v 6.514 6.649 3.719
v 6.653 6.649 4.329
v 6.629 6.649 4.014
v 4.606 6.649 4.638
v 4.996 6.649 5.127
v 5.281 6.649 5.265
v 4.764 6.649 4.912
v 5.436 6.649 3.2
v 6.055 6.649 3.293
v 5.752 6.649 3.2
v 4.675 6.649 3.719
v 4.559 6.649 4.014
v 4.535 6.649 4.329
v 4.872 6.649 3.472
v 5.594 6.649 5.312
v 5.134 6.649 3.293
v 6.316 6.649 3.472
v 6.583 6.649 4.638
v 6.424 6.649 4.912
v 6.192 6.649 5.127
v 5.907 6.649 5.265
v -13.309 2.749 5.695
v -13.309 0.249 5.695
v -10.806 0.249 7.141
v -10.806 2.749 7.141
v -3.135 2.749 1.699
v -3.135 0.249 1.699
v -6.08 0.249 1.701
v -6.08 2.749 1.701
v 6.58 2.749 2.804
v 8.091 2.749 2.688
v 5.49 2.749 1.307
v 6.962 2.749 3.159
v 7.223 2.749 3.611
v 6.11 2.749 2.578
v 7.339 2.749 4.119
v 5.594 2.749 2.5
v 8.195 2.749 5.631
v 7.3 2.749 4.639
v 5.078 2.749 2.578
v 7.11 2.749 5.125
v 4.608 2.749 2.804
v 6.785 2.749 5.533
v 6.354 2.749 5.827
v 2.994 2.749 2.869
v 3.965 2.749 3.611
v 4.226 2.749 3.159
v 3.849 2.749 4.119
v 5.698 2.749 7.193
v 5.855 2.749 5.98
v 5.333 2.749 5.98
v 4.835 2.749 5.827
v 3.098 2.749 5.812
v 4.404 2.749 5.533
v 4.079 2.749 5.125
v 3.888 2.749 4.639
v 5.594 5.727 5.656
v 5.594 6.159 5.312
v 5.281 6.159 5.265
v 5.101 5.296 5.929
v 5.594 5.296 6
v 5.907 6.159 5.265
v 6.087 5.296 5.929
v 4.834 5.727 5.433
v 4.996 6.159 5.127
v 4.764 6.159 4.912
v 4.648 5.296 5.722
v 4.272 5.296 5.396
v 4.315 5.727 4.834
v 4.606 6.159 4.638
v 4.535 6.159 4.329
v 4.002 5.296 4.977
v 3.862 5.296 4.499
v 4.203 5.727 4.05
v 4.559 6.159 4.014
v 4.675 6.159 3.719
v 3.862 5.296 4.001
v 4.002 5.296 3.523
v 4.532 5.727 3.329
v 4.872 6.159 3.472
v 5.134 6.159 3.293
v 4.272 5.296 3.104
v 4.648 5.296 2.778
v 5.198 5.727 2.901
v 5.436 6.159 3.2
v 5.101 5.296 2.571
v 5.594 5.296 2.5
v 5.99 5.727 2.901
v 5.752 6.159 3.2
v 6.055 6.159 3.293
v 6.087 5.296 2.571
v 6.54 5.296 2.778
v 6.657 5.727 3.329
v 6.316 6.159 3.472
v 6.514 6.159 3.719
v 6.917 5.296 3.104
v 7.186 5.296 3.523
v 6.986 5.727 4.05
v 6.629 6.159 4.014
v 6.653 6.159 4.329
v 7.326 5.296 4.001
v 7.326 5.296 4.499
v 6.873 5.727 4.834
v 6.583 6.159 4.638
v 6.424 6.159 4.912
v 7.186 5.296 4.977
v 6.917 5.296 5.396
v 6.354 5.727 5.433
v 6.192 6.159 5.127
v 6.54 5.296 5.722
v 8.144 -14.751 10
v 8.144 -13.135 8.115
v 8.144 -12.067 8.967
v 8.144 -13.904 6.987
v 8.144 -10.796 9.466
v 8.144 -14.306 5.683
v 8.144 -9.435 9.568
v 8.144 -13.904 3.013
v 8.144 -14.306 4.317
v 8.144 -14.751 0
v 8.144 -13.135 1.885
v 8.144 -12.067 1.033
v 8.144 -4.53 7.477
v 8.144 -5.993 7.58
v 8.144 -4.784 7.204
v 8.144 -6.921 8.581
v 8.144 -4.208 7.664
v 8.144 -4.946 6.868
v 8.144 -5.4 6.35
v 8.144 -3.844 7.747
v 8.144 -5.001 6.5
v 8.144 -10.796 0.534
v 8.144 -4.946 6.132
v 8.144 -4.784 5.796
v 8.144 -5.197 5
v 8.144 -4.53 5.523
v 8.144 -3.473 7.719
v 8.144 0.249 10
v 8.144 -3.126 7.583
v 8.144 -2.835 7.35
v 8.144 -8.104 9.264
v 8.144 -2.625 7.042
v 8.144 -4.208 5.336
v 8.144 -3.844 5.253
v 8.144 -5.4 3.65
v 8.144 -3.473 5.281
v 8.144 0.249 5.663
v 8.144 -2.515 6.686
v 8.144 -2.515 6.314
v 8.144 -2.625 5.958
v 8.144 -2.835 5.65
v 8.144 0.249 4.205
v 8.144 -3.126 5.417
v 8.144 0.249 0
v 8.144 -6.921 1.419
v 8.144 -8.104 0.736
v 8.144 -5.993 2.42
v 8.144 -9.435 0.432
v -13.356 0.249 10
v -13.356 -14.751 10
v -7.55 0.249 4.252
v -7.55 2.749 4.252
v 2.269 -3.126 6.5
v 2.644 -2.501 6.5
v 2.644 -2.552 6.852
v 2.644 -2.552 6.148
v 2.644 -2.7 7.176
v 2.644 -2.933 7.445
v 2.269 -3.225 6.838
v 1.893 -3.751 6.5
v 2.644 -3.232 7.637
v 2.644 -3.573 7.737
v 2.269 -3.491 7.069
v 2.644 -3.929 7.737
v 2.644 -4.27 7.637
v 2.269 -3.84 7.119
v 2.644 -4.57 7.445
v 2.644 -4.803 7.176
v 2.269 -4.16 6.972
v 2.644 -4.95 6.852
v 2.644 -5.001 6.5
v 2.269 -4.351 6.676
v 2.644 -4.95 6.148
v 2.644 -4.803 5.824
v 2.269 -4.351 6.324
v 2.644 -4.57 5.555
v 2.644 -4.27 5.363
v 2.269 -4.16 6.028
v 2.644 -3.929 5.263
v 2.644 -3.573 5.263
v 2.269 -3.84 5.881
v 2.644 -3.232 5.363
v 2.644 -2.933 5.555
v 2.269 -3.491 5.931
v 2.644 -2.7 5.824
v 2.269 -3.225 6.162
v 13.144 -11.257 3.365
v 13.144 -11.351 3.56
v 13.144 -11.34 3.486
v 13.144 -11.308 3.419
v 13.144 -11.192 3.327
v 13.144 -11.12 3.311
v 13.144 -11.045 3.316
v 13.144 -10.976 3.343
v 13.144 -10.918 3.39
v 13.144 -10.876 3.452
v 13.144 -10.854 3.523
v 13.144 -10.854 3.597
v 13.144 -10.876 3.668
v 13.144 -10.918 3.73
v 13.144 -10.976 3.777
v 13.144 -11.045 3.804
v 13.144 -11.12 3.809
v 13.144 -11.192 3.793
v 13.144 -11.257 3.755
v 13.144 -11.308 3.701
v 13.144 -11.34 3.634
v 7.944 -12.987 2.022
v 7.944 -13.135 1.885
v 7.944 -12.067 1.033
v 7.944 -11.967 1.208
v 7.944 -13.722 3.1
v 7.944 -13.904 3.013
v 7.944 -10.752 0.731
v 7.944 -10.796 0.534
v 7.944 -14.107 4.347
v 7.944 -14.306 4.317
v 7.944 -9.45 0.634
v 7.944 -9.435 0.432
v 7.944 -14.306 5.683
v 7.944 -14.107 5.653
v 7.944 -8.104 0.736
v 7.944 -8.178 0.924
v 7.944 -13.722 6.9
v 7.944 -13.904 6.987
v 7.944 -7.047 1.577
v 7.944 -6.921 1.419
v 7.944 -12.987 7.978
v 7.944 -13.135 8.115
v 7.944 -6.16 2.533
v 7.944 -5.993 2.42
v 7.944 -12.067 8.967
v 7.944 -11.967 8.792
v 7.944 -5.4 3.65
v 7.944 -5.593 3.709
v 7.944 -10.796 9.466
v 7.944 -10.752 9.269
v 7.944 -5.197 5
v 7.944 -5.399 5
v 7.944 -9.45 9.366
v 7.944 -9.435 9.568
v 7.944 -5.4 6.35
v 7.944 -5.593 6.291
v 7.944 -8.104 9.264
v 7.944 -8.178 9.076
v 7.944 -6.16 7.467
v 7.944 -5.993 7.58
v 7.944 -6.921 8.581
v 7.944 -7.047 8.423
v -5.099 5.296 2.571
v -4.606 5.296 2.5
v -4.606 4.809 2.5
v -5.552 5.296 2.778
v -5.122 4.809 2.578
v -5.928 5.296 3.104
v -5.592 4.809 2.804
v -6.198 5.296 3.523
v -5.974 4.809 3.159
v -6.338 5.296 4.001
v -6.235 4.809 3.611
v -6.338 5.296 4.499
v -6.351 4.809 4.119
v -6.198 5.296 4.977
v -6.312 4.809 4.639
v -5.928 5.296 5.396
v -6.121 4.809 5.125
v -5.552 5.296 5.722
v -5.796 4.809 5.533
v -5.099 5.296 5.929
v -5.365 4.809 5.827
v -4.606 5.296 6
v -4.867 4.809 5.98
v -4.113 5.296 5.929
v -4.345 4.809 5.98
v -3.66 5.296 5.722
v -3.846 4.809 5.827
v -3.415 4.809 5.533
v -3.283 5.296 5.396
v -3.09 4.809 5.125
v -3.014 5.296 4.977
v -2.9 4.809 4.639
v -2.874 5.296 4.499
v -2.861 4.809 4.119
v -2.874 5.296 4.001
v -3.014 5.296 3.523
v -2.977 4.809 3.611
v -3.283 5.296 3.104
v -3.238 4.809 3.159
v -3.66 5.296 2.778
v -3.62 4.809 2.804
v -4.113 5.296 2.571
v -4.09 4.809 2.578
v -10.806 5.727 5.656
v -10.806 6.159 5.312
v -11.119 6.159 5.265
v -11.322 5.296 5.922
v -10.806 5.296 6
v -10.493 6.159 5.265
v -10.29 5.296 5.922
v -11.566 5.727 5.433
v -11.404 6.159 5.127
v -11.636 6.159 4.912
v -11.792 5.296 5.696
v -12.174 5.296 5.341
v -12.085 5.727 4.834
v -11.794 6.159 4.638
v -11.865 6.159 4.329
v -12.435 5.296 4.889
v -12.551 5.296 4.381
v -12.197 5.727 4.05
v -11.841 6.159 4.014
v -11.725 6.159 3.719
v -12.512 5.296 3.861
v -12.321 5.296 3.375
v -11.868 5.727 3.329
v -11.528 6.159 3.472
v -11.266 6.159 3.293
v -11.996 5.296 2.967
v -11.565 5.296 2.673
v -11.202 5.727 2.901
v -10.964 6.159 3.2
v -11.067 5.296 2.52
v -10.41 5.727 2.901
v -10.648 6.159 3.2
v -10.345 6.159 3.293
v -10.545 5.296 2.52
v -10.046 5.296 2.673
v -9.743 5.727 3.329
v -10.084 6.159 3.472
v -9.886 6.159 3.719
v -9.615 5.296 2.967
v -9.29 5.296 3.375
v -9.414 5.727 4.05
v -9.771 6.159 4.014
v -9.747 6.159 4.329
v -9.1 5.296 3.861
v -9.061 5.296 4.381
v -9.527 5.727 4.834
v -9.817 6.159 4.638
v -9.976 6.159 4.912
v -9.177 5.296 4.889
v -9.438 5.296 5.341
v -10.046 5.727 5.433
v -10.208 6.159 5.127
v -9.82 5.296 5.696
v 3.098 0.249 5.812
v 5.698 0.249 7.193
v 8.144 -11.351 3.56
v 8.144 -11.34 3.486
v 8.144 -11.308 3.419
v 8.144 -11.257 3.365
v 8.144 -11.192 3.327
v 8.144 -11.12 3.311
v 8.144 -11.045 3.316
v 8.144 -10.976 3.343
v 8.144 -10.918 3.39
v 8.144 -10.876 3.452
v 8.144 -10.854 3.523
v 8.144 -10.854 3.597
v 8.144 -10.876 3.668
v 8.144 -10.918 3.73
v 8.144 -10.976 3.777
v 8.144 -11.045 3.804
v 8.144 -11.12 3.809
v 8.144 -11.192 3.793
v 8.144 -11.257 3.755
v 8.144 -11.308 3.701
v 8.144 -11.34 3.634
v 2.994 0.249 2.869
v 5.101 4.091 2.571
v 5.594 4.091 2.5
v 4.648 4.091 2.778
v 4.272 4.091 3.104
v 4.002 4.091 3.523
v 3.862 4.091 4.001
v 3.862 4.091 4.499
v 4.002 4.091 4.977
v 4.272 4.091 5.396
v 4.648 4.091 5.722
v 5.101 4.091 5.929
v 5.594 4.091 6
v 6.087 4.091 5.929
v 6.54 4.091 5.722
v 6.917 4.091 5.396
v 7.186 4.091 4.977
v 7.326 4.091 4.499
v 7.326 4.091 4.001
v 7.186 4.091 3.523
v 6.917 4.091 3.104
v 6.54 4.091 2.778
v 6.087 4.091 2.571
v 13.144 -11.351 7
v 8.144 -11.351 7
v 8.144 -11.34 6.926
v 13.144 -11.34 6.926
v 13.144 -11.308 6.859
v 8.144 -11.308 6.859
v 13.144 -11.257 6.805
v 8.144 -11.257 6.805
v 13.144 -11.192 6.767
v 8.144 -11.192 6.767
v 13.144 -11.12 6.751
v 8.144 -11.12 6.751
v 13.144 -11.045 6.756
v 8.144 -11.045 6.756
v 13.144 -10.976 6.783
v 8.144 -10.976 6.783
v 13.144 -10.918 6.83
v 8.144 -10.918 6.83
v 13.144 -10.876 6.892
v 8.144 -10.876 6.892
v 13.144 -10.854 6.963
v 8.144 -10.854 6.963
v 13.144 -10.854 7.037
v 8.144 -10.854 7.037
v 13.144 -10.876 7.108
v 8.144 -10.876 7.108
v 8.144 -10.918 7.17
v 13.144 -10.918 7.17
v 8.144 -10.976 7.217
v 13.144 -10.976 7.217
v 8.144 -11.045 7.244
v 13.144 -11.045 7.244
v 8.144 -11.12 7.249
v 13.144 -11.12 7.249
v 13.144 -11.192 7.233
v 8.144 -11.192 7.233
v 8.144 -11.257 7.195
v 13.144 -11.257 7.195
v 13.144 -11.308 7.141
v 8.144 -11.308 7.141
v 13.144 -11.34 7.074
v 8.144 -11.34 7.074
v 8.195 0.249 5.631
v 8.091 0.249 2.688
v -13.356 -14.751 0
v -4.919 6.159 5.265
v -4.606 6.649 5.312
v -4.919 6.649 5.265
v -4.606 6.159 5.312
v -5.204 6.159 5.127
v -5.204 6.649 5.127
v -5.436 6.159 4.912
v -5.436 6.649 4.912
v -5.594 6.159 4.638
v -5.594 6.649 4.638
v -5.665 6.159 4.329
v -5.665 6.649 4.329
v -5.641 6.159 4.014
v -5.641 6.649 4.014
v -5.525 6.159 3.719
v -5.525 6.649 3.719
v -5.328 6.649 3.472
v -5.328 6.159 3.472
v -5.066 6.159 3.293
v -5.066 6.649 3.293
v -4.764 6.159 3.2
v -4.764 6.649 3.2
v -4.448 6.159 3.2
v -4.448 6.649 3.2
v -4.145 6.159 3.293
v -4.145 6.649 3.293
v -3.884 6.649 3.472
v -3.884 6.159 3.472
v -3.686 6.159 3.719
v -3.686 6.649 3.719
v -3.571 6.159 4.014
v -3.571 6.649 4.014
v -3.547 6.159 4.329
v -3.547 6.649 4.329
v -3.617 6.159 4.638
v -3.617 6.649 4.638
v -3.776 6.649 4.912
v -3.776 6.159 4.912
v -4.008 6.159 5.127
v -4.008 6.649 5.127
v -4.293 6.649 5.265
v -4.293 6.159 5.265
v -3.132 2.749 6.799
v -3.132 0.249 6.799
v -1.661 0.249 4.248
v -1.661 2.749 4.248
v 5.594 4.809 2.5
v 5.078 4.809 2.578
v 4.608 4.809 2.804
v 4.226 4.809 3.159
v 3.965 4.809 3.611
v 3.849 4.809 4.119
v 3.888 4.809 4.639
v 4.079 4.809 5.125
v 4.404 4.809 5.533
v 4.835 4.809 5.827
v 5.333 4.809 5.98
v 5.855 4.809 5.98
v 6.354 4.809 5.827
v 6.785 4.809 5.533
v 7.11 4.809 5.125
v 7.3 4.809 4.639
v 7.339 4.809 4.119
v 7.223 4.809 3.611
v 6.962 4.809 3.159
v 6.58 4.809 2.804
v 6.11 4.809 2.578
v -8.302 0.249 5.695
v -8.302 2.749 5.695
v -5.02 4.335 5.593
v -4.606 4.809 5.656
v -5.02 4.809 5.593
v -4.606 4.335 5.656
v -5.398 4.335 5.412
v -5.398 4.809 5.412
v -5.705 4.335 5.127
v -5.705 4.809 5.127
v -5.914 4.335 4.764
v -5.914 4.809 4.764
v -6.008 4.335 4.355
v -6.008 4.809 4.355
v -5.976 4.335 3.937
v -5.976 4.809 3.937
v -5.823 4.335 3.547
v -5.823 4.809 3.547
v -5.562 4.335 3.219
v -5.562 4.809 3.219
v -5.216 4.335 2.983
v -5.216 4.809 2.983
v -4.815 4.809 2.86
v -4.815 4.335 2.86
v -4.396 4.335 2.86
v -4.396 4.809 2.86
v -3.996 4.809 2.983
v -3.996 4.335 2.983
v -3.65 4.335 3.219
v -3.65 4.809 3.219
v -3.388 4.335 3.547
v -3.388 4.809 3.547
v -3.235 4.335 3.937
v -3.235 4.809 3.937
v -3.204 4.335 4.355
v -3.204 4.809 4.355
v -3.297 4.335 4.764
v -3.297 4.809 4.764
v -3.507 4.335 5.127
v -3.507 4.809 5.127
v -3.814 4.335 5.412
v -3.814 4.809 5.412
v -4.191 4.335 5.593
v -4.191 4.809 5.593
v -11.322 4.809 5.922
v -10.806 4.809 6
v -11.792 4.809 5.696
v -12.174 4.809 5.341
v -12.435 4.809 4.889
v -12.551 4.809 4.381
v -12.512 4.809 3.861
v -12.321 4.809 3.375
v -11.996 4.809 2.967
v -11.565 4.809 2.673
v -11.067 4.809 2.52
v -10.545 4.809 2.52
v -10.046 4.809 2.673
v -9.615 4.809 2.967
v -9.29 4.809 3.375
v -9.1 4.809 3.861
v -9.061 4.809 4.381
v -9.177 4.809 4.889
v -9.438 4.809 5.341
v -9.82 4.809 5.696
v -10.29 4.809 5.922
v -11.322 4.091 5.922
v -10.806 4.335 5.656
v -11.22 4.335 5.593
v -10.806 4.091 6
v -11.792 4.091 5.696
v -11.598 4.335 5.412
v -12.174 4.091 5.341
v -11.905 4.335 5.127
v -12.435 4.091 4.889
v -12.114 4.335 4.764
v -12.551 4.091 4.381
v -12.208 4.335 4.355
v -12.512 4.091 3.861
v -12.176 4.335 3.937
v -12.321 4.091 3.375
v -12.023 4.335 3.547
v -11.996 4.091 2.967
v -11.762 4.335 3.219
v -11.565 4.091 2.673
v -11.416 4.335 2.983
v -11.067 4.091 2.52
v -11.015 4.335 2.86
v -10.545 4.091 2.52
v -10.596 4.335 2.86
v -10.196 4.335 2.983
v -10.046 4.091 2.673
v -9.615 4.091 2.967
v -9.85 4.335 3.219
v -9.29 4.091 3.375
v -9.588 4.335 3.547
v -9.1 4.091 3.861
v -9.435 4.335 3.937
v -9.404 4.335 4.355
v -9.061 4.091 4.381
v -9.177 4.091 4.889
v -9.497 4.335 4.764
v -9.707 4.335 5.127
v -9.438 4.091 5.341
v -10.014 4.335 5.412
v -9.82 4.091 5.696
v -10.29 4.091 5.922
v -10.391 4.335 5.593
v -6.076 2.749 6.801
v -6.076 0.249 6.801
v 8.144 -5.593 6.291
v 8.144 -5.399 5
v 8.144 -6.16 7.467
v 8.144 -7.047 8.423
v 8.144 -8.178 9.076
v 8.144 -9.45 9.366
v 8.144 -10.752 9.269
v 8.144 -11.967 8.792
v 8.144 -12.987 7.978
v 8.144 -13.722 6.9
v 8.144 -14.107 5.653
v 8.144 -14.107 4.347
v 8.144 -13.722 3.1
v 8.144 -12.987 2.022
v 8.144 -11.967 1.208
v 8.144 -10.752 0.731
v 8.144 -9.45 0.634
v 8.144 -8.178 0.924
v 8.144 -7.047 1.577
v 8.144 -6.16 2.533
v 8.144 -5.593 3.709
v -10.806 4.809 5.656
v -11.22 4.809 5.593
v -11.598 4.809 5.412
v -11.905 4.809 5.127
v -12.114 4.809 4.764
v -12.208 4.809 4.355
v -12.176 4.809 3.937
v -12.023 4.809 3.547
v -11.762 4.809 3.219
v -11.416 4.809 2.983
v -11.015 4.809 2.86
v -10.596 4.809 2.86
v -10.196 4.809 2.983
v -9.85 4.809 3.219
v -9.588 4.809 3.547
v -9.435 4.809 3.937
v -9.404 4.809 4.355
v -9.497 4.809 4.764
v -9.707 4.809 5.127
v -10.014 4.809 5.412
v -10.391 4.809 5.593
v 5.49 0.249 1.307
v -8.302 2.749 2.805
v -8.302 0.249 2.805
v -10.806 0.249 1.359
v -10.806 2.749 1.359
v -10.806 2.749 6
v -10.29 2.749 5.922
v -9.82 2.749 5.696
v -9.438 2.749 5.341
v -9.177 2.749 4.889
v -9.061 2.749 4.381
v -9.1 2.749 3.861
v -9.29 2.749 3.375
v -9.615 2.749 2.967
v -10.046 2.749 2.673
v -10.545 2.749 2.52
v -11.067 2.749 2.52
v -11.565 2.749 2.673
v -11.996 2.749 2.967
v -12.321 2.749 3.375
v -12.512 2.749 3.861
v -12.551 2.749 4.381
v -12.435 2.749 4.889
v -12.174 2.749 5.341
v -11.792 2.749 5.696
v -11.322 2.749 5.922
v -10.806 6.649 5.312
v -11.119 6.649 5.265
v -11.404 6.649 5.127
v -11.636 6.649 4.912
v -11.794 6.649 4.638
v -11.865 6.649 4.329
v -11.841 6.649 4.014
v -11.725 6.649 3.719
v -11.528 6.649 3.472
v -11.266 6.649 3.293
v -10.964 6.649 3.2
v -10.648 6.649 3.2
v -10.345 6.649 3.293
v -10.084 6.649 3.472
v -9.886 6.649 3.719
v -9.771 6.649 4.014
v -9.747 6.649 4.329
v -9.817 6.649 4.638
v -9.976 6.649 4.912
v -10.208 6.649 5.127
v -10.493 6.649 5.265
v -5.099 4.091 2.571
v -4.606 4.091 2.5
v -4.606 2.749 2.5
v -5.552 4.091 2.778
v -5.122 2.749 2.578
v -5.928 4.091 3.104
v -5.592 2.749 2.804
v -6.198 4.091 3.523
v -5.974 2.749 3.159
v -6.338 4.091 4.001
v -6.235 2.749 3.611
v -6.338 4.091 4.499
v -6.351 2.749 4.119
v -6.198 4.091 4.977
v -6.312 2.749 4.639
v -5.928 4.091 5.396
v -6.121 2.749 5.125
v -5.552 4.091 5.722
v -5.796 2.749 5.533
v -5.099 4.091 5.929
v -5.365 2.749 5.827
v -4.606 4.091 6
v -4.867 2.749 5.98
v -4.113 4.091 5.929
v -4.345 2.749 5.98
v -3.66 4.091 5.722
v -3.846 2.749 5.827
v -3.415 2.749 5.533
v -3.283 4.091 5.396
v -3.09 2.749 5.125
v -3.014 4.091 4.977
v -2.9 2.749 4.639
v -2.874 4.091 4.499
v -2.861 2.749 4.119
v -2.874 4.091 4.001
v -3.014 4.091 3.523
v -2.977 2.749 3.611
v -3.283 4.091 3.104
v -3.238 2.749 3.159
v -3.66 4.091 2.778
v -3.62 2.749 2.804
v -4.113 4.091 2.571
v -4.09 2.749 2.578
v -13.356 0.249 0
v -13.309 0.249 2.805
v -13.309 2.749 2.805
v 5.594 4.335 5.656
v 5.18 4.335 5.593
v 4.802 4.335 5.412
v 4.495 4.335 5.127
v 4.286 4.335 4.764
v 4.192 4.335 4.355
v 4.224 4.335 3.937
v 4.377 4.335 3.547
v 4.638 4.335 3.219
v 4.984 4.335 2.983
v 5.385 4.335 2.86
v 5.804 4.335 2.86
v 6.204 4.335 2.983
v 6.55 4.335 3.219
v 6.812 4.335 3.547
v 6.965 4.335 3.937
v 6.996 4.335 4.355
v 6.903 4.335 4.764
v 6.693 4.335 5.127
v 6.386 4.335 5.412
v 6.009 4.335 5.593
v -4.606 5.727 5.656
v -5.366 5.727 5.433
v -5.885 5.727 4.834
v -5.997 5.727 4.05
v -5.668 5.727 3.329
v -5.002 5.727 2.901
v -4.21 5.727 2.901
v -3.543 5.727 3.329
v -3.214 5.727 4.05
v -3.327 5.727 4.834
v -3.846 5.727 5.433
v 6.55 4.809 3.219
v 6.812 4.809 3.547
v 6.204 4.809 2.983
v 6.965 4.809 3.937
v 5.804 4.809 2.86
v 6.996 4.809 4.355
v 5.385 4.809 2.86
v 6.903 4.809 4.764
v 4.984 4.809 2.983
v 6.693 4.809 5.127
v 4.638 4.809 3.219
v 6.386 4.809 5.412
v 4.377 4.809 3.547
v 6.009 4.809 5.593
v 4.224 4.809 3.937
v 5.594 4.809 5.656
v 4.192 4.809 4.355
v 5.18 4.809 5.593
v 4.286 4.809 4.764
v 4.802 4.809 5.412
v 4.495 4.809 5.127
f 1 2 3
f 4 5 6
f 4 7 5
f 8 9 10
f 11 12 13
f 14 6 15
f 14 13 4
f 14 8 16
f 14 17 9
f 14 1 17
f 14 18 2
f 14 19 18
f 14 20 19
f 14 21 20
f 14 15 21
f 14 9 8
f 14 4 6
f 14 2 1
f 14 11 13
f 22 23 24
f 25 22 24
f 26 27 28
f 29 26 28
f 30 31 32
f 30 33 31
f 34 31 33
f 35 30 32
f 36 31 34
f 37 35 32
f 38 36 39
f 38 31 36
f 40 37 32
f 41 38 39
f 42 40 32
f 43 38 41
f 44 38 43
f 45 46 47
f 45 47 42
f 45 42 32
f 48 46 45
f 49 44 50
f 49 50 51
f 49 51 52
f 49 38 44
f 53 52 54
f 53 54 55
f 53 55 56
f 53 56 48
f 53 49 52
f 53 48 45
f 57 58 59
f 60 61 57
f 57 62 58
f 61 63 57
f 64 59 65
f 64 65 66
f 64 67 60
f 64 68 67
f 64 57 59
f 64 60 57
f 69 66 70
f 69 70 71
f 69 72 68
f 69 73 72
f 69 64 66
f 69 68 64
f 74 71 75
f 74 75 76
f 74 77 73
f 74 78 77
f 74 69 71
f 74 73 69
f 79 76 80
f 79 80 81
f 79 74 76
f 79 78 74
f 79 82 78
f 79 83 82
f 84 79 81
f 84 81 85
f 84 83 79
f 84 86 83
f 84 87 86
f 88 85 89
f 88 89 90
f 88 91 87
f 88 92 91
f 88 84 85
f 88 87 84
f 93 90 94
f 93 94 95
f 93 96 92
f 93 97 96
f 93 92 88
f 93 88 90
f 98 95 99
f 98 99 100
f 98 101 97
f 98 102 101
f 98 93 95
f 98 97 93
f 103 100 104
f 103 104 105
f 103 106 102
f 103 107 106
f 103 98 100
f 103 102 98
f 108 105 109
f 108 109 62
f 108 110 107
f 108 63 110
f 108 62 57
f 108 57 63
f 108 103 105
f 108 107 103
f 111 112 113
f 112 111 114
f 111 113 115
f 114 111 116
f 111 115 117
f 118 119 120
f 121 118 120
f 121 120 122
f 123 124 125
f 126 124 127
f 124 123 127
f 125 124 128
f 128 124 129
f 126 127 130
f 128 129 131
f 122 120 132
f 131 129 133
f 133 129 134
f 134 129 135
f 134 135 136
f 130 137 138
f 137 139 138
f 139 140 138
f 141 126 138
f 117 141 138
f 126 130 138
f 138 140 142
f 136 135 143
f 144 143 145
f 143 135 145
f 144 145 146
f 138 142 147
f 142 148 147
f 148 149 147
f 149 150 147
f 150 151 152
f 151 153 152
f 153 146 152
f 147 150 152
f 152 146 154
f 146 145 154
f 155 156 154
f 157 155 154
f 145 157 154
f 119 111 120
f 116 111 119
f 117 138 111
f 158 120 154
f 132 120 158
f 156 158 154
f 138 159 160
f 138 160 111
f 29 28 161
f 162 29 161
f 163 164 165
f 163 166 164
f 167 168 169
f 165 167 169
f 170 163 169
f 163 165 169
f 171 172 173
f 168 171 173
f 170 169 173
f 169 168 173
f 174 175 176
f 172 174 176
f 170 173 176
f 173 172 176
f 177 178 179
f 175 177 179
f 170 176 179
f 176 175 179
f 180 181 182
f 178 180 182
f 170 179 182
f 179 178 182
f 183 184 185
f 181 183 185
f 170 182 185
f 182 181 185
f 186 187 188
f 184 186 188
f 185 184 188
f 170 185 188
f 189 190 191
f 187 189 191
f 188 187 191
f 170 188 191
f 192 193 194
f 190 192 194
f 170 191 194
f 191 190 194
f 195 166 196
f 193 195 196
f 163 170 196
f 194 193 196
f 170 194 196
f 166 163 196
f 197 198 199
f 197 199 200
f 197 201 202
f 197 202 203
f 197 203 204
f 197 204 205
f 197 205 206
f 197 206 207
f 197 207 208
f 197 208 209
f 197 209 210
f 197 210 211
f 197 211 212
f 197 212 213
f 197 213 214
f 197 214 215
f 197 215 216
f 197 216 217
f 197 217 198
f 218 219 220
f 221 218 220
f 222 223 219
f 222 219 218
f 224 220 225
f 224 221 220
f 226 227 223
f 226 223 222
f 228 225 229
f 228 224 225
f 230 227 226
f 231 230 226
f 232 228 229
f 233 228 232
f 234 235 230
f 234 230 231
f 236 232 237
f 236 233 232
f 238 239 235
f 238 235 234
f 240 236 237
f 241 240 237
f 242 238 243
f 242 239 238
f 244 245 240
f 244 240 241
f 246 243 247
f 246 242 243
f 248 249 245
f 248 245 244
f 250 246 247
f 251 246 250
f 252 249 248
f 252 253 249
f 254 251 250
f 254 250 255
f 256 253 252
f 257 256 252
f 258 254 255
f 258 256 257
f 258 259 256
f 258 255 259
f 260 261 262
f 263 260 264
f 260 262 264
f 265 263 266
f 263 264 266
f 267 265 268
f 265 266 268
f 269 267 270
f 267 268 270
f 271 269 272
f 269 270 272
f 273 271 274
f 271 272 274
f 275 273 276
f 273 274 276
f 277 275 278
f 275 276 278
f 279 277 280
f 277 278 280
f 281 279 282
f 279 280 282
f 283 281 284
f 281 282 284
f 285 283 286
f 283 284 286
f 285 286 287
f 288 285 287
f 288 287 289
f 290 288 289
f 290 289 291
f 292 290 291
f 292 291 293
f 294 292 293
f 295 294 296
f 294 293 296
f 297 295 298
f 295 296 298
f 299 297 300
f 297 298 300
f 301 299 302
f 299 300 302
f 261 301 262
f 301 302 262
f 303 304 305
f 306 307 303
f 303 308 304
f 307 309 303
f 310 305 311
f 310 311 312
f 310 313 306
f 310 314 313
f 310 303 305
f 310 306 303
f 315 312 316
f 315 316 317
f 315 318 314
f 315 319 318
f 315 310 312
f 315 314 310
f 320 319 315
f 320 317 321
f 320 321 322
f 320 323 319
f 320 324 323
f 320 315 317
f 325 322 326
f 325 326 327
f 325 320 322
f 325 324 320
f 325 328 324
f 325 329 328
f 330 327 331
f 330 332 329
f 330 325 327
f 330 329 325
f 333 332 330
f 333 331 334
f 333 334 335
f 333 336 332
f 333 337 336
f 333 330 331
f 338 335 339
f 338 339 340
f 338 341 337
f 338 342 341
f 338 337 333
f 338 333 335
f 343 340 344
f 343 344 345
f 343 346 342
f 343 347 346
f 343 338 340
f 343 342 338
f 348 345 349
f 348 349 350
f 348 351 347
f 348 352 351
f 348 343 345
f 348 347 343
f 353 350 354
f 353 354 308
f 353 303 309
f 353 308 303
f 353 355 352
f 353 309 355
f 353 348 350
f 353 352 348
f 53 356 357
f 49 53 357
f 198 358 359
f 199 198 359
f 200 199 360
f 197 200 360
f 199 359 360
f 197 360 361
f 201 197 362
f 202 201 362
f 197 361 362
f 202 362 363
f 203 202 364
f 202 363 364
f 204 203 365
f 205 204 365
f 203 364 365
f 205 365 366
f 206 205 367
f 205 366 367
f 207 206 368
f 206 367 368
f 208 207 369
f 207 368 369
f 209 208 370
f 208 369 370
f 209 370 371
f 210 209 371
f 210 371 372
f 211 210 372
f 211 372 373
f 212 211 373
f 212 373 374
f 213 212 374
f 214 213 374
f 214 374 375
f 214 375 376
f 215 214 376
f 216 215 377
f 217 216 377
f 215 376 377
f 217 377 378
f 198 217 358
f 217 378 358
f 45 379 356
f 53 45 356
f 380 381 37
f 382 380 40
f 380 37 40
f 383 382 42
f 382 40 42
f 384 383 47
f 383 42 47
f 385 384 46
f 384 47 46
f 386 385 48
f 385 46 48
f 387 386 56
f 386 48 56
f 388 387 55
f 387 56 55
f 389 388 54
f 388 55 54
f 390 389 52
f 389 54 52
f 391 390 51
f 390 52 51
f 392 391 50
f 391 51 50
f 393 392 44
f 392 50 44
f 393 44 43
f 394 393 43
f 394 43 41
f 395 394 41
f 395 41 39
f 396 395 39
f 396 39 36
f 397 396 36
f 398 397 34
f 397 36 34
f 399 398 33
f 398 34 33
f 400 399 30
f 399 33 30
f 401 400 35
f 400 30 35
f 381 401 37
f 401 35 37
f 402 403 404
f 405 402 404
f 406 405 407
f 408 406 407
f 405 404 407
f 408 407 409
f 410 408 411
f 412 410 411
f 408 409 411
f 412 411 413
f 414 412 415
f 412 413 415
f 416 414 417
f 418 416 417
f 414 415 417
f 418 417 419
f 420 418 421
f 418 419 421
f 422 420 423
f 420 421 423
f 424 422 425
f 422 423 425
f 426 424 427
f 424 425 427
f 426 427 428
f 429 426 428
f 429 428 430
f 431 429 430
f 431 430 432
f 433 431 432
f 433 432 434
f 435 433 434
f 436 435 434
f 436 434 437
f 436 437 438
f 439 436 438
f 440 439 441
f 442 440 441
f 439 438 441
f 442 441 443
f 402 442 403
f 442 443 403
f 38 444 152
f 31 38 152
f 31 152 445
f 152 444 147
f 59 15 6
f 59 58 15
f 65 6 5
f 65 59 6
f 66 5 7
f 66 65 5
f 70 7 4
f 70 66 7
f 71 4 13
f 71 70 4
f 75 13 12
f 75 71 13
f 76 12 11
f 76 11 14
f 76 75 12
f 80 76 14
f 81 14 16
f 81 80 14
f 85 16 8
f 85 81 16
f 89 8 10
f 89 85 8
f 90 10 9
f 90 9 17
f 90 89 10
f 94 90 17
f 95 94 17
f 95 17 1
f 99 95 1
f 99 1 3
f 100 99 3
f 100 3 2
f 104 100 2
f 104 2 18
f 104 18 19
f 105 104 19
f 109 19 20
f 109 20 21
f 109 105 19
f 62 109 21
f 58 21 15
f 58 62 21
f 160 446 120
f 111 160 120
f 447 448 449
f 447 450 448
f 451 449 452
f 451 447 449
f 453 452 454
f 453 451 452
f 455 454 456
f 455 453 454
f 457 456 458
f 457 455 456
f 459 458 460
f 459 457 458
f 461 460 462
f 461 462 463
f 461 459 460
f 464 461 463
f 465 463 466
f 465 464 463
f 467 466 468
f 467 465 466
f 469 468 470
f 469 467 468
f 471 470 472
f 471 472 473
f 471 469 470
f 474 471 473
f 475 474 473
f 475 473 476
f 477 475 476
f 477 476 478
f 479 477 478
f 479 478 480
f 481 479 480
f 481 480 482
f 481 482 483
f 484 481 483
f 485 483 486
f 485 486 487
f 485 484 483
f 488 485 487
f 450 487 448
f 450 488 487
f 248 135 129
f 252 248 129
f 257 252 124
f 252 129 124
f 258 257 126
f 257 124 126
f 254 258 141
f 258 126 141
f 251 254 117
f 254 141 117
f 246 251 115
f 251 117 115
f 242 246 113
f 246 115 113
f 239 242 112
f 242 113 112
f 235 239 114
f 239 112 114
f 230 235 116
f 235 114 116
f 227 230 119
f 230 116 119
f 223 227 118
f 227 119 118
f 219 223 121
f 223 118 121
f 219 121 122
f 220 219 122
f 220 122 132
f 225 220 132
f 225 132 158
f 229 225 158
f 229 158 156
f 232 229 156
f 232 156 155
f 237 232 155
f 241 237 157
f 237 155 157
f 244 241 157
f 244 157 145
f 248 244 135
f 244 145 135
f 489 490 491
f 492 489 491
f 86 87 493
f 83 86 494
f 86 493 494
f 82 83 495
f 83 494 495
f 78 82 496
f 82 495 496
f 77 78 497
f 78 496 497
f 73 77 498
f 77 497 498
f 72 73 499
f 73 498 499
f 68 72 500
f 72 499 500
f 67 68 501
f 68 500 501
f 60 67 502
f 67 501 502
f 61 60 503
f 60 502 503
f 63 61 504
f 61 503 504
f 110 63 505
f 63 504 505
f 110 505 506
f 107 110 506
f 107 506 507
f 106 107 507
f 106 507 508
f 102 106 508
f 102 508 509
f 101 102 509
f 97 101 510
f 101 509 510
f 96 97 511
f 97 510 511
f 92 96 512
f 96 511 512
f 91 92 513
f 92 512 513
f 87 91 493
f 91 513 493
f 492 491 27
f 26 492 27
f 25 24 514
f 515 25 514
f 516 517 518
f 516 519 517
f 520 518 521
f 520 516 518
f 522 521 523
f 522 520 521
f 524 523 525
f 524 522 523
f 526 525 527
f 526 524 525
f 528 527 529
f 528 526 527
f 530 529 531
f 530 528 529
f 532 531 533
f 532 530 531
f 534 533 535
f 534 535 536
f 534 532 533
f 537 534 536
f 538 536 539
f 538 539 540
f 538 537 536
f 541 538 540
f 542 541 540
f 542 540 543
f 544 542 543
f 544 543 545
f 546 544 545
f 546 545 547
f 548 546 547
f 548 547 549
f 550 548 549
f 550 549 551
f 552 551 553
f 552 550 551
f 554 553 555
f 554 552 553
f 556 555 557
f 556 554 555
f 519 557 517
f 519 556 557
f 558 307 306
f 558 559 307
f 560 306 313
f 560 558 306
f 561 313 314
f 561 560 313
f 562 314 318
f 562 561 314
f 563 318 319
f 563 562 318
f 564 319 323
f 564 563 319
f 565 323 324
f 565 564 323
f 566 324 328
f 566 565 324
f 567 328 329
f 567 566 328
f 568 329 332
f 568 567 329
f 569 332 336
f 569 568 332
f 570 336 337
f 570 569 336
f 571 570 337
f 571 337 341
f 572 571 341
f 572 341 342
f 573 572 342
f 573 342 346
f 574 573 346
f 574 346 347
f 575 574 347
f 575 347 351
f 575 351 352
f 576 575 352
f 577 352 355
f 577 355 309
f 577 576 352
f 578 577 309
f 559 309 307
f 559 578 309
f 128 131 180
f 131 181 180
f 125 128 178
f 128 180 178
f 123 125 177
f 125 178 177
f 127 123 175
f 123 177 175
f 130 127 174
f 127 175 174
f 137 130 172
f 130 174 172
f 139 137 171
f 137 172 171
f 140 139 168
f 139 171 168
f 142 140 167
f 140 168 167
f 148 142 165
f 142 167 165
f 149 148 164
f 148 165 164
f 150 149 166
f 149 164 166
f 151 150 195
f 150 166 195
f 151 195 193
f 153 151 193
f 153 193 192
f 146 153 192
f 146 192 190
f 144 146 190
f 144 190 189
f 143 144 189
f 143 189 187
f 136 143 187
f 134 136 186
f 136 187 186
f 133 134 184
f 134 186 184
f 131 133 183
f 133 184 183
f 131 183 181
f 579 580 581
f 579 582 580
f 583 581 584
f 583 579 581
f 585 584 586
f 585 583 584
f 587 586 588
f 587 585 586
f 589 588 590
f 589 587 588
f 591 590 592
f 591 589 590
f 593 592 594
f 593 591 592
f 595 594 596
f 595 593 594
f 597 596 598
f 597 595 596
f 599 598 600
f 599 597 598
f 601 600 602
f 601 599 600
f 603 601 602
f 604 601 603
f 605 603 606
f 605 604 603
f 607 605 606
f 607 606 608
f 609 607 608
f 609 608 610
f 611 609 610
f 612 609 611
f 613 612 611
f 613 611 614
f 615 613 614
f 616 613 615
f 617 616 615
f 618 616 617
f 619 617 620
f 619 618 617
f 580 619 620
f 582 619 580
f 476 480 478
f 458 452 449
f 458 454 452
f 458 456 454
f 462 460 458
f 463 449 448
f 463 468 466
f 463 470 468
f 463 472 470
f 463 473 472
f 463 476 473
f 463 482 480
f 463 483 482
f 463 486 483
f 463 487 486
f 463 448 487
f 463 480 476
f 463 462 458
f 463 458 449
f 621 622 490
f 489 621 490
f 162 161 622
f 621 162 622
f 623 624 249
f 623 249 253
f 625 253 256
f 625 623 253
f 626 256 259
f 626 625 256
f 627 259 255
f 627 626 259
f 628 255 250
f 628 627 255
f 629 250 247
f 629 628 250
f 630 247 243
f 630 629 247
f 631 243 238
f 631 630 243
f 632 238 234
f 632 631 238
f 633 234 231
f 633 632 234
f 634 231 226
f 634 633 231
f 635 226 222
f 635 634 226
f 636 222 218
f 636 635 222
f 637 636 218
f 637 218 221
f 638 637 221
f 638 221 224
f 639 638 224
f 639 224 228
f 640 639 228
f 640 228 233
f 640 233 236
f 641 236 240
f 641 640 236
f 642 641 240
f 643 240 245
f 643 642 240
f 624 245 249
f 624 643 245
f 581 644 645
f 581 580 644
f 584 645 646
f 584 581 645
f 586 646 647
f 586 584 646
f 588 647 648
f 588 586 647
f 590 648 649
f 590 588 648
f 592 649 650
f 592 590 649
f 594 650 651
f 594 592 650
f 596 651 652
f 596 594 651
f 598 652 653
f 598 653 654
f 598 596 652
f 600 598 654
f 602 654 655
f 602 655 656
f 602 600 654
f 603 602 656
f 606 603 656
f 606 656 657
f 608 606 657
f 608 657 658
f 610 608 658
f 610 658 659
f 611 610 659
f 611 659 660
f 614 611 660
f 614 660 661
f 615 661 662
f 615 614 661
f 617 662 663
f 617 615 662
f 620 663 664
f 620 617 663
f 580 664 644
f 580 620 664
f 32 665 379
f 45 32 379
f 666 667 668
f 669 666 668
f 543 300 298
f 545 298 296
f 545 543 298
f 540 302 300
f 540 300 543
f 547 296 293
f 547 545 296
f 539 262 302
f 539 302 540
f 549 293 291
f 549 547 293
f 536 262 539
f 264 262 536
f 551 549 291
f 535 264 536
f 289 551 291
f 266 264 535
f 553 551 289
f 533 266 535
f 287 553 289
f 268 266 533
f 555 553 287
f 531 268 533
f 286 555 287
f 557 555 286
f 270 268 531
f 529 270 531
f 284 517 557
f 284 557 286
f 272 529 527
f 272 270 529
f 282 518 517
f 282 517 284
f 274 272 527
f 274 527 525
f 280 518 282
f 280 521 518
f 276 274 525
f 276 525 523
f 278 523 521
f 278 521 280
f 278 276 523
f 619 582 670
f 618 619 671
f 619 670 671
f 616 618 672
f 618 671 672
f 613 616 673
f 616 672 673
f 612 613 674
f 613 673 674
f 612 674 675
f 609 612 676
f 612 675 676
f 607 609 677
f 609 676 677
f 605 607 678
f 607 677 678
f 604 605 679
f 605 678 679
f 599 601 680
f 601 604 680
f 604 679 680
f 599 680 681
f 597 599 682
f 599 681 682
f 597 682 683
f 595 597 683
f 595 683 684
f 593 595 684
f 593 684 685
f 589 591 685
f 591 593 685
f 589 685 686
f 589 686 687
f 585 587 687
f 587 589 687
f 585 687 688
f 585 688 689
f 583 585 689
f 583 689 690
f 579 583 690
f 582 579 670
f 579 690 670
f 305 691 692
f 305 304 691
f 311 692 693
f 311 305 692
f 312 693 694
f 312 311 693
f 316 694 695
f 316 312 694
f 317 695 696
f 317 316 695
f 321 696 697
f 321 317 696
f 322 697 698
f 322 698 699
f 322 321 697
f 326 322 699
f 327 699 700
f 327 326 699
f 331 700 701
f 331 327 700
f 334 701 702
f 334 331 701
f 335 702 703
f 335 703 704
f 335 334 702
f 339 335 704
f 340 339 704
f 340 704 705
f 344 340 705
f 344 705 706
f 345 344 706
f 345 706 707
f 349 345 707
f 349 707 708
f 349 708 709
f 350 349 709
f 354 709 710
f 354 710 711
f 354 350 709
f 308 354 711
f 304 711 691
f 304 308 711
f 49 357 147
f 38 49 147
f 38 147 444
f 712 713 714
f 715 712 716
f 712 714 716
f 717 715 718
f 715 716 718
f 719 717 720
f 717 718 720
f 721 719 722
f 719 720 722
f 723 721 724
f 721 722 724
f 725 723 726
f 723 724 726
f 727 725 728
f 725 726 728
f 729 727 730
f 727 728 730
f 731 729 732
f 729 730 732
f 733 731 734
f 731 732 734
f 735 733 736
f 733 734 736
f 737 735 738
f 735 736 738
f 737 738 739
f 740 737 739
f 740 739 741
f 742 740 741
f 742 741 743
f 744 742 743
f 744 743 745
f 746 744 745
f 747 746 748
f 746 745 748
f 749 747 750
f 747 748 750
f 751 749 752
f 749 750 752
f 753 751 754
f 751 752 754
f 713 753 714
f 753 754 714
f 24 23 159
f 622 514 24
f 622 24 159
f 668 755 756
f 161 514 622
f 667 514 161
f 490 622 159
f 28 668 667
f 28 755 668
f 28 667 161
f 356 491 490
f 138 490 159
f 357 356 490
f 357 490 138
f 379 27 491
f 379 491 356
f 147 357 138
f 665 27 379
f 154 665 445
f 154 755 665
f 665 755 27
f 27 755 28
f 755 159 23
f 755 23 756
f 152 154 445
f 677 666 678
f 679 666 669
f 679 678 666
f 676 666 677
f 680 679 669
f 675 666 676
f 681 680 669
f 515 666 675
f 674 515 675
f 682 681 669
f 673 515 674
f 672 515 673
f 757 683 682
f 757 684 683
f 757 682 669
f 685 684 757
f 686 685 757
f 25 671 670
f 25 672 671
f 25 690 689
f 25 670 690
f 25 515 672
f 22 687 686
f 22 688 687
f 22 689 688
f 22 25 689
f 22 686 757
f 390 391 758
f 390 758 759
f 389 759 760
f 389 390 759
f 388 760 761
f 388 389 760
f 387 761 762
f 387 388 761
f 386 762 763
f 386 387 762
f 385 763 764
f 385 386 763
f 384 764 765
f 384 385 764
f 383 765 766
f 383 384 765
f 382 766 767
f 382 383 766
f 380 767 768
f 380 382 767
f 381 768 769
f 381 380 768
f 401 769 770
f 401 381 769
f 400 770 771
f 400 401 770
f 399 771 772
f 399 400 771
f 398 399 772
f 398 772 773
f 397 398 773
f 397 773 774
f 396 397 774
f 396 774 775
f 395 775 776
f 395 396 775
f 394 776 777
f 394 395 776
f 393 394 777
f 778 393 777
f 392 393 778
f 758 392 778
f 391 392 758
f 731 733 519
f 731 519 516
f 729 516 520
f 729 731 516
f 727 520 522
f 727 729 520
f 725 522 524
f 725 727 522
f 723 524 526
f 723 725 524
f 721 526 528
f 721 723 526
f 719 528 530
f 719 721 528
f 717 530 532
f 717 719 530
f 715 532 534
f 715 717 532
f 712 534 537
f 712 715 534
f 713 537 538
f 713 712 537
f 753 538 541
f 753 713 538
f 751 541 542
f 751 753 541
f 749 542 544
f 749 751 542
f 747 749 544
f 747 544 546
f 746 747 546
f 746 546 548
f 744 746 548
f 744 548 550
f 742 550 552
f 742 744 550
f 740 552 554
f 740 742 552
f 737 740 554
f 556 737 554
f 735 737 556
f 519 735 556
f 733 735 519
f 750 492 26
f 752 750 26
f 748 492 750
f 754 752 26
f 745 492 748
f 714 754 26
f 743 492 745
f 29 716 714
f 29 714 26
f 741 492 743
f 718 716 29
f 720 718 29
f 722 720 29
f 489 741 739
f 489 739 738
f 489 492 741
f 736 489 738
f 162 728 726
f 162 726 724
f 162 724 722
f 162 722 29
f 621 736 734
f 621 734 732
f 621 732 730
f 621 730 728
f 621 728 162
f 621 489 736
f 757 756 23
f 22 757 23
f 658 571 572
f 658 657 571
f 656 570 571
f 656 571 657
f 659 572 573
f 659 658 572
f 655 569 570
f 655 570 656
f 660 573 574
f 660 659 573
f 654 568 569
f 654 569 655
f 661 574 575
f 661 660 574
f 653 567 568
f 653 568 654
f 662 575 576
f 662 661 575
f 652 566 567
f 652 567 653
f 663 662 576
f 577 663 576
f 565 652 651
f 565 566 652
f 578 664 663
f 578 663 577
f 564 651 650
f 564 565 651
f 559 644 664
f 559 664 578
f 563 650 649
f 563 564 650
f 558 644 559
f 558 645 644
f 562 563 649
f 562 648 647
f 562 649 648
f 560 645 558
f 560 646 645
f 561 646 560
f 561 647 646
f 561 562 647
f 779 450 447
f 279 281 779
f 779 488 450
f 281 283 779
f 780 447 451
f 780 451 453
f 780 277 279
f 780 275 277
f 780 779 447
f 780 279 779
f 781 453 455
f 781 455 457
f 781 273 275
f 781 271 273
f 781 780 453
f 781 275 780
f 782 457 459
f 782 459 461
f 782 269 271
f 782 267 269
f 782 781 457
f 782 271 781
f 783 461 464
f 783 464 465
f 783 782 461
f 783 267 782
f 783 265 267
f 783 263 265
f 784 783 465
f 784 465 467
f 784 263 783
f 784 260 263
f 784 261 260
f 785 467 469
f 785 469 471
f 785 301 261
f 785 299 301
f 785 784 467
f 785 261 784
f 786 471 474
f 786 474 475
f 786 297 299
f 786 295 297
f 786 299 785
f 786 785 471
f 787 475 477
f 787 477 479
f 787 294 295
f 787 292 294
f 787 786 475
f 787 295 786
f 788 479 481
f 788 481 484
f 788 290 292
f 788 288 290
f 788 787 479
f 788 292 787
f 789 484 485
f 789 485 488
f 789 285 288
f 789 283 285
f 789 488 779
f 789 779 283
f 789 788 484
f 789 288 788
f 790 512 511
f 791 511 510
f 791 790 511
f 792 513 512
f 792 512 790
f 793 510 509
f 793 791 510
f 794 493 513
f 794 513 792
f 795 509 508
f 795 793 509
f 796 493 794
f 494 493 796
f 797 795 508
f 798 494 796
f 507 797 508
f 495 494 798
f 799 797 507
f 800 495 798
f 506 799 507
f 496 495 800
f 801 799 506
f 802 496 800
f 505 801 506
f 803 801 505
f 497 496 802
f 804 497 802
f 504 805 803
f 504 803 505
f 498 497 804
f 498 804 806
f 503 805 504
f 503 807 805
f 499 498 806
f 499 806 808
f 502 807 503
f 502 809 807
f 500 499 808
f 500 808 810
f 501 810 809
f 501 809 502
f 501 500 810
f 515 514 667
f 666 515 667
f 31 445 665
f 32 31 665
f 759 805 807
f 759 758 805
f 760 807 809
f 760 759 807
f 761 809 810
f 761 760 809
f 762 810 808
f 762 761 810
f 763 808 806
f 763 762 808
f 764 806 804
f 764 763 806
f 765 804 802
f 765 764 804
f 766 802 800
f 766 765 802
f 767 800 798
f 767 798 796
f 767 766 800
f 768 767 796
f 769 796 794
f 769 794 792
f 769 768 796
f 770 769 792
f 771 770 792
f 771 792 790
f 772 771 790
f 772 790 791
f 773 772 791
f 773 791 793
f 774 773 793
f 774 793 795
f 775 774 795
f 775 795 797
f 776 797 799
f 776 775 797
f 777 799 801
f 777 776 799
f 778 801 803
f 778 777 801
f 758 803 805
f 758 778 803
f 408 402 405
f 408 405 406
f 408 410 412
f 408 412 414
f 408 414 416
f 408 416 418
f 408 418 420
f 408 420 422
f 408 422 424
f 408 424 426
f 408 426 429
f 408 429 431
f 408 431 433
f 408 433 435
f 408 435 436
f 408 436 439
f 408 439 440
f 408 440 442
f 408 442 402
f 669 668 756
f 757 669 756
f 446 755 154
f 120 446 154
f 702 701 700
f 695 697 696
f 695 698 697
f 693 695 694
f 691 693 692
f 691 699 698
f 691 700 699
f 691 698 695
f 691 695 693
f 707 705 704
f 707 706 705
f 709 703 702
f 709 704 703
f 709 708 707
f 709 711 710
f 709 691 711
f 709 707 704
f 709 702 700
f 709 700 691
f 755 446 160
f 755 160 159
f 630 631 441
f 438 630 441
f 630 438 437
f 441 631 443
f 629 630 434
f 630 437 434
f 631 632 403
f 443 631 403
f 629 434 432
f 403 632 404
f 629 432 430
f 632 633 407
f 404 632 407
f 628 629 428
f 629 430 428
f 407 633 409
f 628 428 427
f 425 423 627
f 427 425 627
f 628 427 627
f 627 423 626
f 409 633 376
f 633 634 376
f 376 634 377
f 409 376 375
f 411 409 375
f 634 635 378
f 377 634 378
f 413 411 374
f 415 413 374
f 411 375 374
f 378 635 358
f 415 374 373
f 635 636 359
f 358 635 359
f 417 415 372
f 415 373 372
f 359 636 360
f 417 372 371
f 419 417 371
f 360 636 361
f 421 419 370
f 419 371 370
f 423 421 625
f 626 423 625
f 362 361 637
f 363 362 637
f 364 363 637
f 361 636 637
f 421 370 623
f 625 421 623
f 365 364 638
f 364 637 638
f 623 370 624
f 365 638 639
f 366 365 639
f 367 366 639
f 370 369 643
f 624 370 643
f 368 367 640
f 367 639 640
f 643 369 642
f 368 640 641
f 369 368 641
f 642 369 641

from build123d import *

# Parameters (mm, degrees)
ESQUISSE1_W               = 21.5
ESQUISSE1_H               = 15
EXTRUSION1_DEPTH          = 10
EXTRUSION2_DEPTH          = 2.5
ESQUISSE4_R               = 1.75
EXTRUSION3_DEPTH          = 3.9
ESQUISSE7_R               = 0.25
EXTRUSION4_DEPTH          = 5
ESQUISSE8_R               = 4.580355977
ESQUISSE8_R_2             = 4.37854461
ENL_V_MAT_EXTRU_3_DEPTH   = 0.2
TROU_TARAUD_M3X0_52_D     = 2.5
TROU_TARAUD_M3X0_52_DEPTH = 5.5
TROU_TARAUD_M3X0_52_TIP   = 0.751075774


with BuildPart() as part:
    # Esquisse1 → Extrusion1 (new body)
    with BuildSketch(Plane.XY):
        with Locations((-2.605785234, -7.251083667)):
            Rectangle(ESQUISSE1_W, ESQUISSE1_H)
    extrude(amount=EXTRUSION1_DEPTH)

    # Esquisse2 → Extrusion2 (add)
    with BuildSketch(Plane(origin=(0, 0.248916333, 0), x_dir=(-1, 0, 0), z_dir=(0, 1, 0))):
        Polygon((13.309313152, 5.695412518), (10.805785234, 7.140825036), (8.302257315, 5.695412518), (8.302257315, 2.804587482), (10.805785234, 1.359174964), (13.309313152, 2.804587482), align=None)
        Polygon((6.076207844, 6.801050244), (3.131722221, 6.798948457), (1.661299611, 4.247898212), (3.135362624, 1.698949756), (6.079848247, 1.701051543), (7.550270856, 4.252101788), align=None)
        Polygon((-3.097880639, 5.811510782), (-5.698355708, 7.192644162), (-8.194689836, 5.63113338), (-8.090548894, 2.688489218), (-5.490073824, 1.307355838), (-2.993739697, 2.86886662), align=None)
    extrude(amount=EXTRUSION2_DEPTH)

    # Esquisse4 → Extrusion3 (add)
    with BuildSketch(Plane(origin=(0, 2.748916333, 0), x_dir=(-1, 0, 0), z_dir=(0, 1, 0))):
        with Locations((10.805785234, 4.25)):
            Circle(ESQUISSE4_R)
        with Locations((4.605785234, 4.25)):
            Circle(ESQUISSE4_R)
        with Locations((-5.594214766, 4.25)):
            Circle(ESQUISSE4_R)
    extrude(amount=EXTRUSION3_DEPTH)

    # Esquisse7 → Extrusion4 (add)
    with BuildSketch(Plane(origin=(8.144214766, 0, 0), x_dir=(0, 0, -1), z_dir=(1, 0, 0))):
        with Locations((-3.56, -11.101083667)):
            Circle(ESQUISSE7_R)
        with Locations((-7, -11.101083667)):
            Circle(ESQUISSE7_R)
    extrude(amount=EXTRUSION4_DEPTH)

    # Esquisse8 → Enlèv. mat.-Extru.3 (cut)
    with BuildSketch(Plane(origin=(8.144214766, 0, 0), x_dir=(0, 0, -1), z_dir=(1, 0, 0))):
        with Locations((-5, -9.777233514)):
            Circle(ESQUISSE8_R)
        with Locations((-5, -9.777233514)):
            Circle(ESQUISSE8_R_2, mode=Mode.SUBTRACT)
    extrude(amount=-ENL_V_MAT_EXTRU_3_DEPTH, mode=Mode.SUBTRACT)

    # Trou taraudé M3x0.52
    with Locations(Plane(origin=(8.144214766, -3.751083667, 6.5), x_dir=(0, 1, 0), z_dir=(1, 0, 0))):
        with Locations((0, 0)):
            Hole(TROU_TARAUD_M3X0_52_D / 2, depth=TROU_TARAUD_M3X0_52_DEPTH)
            with Locations((0, 0, -(TROU_TARAUD_M3X0_52_DEPTH + TROU_TARAUD_M3X0_52_TIP / 2))):  # 118° drill point
                Cone(0, TROU_TARAUD_M3X0_52_D / 2, TROU_TARAUD_M3X0_52_TIP, mode=Mode.SUBTRACT)

    # Esquisse13 → Enlèvement de matière-Révolution1 (revolve, cut)
    with BuildSketch(Plane.XY.offset(4.25)):
        Polygon((-9.744077061, 6.648916333), (-9.744077061, 6.159304946), (-9.055785234, 5.295659421), (-9.055785234, 4.809098562), (-9.399931147, 4.809098562), (-9.399931147, 4.334701724), (-9.055785234, 4.091421295), (-9.055785234, 2.748916333), (-8.612823064, 2.748916333), (-8.612823064, 6.648916333), align=None)
    revolve(axis=Axis((-10.805785234, 6.648916333, 4.25), (0, -1, 0)), mode=Mode.SUBTRACT)

    # Esquisse14 → Enlèvement de matière-Révolution2 (revolve, cut)
    with BuildSketch(Plane.XY.offset(4.25)):
        Polygon((-3.544077061, 6.648916333), (-3.544077061, 6.159304946), (-2.855785234, 5.295659421), (-2.855785234, 4.809098562), (-3.199931147, 4.809098562), (-3.199931147, 4.334701724), (-2.855785234, 4.091421295), (-2.855785234, 2.748916333), (-2.412823064, 2.748916333), (-2.412823064, 6.648916333), align=None)
    revolve(axis=Axis((-4.605785234, 6.648916333, 4.25), (0, -1, 0)), mode=Mode.SUBTRACT)

    # Esquisse15 → Enlèvement de matière-Révolution3 (revolve, cut)
    with BuildSketch(Plane.XY.offset(4.25)):
        Polygon((6.655922939, 6.648916333), (6.655922939, 6.159304946), (7.344214766, 5.295659421), (7.344214766, 4.809098562), (7.000068853, 4.809098562), (7.000068853, 4.334701724), (7.344214766, 4.091421295), (7.344214766, 2.748916333), (7.787176936, 2.748916333), (7.787176936, 6.648916333), align=None)
    revolve(axis=Axis((5.594214766, 6.648916333, 4.25), (0, -1, 0)), mode=Mode.SUBTRACT)


solid = part.part
